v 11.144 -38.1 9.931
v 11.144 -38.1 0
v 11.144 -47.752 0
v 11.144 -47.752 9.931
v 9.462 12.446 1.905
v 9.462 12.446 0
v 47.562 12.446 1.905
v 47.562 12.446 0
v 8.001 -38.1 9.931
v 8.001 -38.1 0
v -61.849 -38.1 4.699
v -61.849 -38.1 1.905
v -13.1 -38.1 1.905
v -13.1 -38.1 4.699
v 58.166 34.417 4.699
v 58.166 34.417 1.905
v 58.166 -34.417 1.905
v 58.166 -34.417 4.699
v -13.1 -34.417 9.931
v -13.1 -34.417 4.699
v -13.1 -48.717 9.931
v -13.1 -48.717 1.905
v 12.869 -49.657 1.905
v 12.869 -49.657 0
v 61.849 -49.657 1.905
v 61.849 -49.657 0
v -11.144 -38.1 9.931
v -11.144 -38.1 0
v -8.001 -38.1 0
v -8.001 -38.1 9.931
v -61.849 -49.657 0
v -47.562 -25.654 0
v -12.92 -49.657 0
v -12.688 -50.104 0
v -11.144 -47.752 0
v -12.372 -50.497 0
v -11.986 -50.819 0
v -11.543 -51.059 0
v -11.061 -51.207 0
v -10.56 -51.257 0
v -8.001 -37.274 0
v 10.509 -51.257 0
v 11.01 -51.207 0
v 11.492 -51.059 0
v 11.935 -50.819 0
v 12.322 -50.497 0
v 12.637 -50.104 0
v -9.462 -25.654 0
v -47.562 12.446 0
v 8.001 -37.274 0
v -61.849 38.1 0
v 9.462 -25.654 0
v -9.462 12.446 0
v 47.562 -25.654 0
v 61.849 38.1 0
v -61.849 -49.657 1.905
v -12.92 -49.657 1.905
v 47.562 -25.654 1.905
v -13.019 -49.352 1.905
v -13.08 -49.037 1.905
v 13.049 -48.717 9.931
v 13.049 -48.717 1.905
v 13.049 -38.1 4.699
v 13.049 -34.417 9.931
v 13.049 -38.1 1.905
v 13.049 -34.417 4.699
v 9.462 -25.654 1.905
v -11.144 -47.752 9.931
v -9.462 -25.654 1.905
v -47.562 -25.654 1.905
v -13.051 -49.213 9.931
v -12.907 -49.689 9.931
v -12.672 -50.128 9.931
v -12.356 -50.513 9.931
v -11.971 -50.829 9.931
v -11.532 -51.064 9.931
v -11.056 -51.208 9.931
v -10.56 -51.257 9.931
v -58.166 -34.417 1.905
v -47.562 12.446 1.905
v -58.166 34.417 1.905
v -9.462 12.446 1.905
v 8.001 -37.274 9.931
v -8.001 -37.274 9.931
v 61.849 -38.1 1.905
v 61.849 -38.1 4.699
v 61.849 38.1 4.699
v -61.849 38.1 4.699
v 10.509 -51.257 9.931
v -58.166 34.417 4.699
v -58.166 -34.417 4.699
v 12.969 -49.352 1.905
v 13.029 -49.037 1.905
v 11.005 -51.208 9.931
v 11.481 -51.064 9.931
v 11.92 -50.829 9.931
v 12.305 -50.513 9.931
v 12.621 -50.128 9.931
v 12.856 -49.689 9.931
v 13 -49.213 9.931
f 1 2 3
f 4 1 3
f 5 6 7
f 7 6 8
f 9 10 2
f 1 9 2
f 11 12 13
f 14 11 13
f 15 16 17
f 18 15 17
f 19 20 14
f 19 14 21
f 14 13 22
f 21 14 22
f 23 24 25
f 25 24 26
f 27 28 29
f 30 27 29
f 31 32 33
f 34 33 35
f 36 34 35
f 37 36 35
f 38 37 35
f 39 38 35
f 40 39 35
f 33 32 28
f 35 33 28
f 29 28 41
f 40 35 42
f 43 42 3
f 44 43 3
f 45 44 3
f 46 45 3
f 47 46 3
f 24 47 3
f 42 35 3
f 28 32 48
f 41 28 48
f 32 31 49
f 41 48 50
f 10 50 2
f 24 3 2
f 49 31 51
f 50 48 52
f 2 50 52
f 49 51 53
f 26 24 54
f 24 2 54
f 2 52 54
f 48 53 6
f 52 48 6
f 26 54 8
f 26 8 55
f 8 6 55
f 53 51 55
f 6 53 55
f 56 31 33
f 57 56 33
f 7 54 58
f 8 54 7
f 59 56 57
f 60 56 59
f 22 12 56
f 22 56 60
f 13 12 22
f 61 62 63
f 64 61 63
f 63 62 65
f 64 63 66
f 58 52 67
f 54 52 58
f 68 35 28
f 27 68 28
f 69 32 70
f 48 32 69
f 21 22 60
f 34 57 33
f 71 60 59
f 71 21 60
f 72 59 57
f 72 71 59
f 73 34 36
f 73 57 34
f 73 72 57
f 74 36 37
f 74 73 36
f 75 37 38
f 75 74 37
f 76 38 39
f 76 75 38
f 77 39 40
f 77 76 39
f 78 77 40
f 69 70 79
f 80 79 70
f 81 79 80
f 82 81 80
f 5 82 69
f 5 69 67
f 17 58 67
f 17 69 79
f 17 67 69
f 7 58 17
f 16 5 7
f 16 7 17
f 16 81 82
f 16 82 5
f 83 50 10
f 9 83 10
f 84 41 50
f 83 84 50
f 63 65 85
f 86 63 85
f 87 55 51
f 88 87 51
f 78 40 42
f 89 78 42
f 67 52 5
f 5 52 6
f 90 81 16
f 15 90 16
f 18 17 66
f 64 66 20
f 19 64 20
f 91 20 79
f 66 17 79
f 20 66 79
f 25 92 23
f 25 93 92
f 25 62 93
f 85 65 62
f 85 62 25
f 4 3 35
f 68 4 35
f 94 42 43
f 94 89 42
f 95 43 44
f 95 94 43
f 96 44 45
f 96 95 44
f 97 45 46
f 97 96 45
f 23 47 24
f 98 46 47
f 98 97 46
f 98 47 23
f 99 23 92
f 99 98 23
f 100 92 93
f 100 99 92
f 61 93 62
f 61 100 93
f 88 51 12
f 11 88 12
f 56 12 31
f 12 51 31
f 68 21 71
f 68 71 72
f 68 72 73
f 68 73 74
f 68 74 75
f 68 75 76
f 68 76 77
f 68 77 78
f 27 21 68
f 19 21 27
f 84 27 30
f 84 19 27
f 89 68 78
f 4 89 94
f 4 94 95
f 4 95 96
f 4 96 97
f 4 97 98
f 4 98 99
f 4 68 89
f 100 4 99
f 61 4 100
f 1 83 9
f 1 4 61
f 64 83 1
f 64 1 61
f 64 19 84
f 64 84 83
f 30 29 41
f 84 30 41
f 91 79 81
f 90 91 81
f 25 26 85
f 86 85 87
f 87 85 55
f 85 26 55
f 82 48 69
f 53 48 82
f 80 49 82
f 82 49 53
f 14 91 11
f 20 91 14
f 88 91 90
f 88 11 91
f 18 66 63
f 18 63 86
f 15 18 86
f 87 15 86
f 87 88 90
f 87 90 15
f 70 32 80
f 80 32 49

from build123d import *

# Parameters (mm, degrees)
F0_W     = 38.1
F0_H     = 38.1
F1_DEPTH = 1.905
F0_W_2   = 48.74895
F0_H_2   = 11.557
F0_W_3   = 48.79975
F2_DEPTH = 4.699
F0_W_4   = 13.589
F0_H_3   = 3.5052
F3_DEPTH = 9.9314
F4_R     = 2.54


# Not quite as in the source:
# - a feature names something its author has since deleted; it is built from what else it names


with BuildPart() as f1:
    # F0 (on Top) → F1 (new body)
    with BuildSketch(Plane.XY):
        Polygon((-13.10005, -34.417), (13.04925, -34.417), (58.166, -34.417), (58.166, 34.417), (-58.166, 34.417), (-58.166, -34.417), align=None)
        with Locations((-28.5115, -6.604)):
            Rectangle(F0_W, F0_H, mode=Mode.SUBTRACT)
        with Locations((28.5115, -6.604)):
            Rectangle(F0_W, F0_H, mode=Mode.SUBTRACT)
    extrude(amount=F1_DEPTH)



with BuildPart() as f1b:
    # F0 (on Top) → F1, piece 2 (new body)
    with BuildSketch(Plane.XY):
        with Locations((-37.474525, -43.8785)):
            Rectangle(F0_W_2, F0_H_2)
    extrude(amount=F1_DEPTH)


with BuildPart() as f1c:
    # F0 (on Top) → F1, piece 3 (new body)
    with BuildSketch(Plane.XY):
        with Locations((37.449125, -43.8785)):
            Rectangle(F0_W_3, F0_H_2)
    extrude(amount=F1_DEPTH)


with BuildPart() as f1_1:
    add(f1.part)

    add(f1b.part)  # F2 merges F1b

    add(f1c.part)  # F2 merges F1c
    # F0 (on Top) → F2 (join)
    with BuildSketch(Plane.XY):
        Polygon((61.849, -38.1), (61.849, 38.1), (-61.849, 38.1), (-61.849, -38.1), (-13.10005, -38.1), (-13.10005, -34.417), (-58.166, -34.417), (-58.166, 34.417), (58.166, 34.417), (58.166, -34.417), (13.04925, -34.417), (13.04925, -38.1), align=None)
    extrude(amount=F2_DEPTH)

    # F0 (on Top) → F3 (join)
    with BuildSketch(Plane.XY):
        Polygon((11.14425, -38.1), (13.04925, -38.1), (13.04925, -34.417), (-13.10005, -34.417), (-13.10005, -38.1), (-11.14425, -38.1), (-8.001, -38.1), (-8.001, -37.2745), (8.001, -37.2745), (8.001, -38.1), align=None)
        Polygon((-11.14425, -38.1), (-13.10005, -38.1), (-13.10005, -49.657), (-13.10005, -51.2572), (-6.7945, -51.2572), (-6.7945, -47.752), (-11.14425, -47.752), align=None)
        Polygon((13.04925, -49.657), (13.04925, -38.1), (11.14425, -38.1), (11.14425, -47.752), (6.7945, -47.752), (6.7945, -51.2572), (13.04925, -51.2572), align=None)
        with Locations((0, -49.5046)):
            Rectangle(F0_W_4, F0_H_3)
    extrude(amount=F3_DEPTH)

    # F4
    f4_edges = [f1_1.edges().sort_by_distance(p)[0] for p in [
        (-13.10005, -51.2572, 4.9657),
        (13.04925, -51.2572, 4.9657),
    ]]
    fillet(f4_edges, radius=F4_R)


solid = f1_1.part
